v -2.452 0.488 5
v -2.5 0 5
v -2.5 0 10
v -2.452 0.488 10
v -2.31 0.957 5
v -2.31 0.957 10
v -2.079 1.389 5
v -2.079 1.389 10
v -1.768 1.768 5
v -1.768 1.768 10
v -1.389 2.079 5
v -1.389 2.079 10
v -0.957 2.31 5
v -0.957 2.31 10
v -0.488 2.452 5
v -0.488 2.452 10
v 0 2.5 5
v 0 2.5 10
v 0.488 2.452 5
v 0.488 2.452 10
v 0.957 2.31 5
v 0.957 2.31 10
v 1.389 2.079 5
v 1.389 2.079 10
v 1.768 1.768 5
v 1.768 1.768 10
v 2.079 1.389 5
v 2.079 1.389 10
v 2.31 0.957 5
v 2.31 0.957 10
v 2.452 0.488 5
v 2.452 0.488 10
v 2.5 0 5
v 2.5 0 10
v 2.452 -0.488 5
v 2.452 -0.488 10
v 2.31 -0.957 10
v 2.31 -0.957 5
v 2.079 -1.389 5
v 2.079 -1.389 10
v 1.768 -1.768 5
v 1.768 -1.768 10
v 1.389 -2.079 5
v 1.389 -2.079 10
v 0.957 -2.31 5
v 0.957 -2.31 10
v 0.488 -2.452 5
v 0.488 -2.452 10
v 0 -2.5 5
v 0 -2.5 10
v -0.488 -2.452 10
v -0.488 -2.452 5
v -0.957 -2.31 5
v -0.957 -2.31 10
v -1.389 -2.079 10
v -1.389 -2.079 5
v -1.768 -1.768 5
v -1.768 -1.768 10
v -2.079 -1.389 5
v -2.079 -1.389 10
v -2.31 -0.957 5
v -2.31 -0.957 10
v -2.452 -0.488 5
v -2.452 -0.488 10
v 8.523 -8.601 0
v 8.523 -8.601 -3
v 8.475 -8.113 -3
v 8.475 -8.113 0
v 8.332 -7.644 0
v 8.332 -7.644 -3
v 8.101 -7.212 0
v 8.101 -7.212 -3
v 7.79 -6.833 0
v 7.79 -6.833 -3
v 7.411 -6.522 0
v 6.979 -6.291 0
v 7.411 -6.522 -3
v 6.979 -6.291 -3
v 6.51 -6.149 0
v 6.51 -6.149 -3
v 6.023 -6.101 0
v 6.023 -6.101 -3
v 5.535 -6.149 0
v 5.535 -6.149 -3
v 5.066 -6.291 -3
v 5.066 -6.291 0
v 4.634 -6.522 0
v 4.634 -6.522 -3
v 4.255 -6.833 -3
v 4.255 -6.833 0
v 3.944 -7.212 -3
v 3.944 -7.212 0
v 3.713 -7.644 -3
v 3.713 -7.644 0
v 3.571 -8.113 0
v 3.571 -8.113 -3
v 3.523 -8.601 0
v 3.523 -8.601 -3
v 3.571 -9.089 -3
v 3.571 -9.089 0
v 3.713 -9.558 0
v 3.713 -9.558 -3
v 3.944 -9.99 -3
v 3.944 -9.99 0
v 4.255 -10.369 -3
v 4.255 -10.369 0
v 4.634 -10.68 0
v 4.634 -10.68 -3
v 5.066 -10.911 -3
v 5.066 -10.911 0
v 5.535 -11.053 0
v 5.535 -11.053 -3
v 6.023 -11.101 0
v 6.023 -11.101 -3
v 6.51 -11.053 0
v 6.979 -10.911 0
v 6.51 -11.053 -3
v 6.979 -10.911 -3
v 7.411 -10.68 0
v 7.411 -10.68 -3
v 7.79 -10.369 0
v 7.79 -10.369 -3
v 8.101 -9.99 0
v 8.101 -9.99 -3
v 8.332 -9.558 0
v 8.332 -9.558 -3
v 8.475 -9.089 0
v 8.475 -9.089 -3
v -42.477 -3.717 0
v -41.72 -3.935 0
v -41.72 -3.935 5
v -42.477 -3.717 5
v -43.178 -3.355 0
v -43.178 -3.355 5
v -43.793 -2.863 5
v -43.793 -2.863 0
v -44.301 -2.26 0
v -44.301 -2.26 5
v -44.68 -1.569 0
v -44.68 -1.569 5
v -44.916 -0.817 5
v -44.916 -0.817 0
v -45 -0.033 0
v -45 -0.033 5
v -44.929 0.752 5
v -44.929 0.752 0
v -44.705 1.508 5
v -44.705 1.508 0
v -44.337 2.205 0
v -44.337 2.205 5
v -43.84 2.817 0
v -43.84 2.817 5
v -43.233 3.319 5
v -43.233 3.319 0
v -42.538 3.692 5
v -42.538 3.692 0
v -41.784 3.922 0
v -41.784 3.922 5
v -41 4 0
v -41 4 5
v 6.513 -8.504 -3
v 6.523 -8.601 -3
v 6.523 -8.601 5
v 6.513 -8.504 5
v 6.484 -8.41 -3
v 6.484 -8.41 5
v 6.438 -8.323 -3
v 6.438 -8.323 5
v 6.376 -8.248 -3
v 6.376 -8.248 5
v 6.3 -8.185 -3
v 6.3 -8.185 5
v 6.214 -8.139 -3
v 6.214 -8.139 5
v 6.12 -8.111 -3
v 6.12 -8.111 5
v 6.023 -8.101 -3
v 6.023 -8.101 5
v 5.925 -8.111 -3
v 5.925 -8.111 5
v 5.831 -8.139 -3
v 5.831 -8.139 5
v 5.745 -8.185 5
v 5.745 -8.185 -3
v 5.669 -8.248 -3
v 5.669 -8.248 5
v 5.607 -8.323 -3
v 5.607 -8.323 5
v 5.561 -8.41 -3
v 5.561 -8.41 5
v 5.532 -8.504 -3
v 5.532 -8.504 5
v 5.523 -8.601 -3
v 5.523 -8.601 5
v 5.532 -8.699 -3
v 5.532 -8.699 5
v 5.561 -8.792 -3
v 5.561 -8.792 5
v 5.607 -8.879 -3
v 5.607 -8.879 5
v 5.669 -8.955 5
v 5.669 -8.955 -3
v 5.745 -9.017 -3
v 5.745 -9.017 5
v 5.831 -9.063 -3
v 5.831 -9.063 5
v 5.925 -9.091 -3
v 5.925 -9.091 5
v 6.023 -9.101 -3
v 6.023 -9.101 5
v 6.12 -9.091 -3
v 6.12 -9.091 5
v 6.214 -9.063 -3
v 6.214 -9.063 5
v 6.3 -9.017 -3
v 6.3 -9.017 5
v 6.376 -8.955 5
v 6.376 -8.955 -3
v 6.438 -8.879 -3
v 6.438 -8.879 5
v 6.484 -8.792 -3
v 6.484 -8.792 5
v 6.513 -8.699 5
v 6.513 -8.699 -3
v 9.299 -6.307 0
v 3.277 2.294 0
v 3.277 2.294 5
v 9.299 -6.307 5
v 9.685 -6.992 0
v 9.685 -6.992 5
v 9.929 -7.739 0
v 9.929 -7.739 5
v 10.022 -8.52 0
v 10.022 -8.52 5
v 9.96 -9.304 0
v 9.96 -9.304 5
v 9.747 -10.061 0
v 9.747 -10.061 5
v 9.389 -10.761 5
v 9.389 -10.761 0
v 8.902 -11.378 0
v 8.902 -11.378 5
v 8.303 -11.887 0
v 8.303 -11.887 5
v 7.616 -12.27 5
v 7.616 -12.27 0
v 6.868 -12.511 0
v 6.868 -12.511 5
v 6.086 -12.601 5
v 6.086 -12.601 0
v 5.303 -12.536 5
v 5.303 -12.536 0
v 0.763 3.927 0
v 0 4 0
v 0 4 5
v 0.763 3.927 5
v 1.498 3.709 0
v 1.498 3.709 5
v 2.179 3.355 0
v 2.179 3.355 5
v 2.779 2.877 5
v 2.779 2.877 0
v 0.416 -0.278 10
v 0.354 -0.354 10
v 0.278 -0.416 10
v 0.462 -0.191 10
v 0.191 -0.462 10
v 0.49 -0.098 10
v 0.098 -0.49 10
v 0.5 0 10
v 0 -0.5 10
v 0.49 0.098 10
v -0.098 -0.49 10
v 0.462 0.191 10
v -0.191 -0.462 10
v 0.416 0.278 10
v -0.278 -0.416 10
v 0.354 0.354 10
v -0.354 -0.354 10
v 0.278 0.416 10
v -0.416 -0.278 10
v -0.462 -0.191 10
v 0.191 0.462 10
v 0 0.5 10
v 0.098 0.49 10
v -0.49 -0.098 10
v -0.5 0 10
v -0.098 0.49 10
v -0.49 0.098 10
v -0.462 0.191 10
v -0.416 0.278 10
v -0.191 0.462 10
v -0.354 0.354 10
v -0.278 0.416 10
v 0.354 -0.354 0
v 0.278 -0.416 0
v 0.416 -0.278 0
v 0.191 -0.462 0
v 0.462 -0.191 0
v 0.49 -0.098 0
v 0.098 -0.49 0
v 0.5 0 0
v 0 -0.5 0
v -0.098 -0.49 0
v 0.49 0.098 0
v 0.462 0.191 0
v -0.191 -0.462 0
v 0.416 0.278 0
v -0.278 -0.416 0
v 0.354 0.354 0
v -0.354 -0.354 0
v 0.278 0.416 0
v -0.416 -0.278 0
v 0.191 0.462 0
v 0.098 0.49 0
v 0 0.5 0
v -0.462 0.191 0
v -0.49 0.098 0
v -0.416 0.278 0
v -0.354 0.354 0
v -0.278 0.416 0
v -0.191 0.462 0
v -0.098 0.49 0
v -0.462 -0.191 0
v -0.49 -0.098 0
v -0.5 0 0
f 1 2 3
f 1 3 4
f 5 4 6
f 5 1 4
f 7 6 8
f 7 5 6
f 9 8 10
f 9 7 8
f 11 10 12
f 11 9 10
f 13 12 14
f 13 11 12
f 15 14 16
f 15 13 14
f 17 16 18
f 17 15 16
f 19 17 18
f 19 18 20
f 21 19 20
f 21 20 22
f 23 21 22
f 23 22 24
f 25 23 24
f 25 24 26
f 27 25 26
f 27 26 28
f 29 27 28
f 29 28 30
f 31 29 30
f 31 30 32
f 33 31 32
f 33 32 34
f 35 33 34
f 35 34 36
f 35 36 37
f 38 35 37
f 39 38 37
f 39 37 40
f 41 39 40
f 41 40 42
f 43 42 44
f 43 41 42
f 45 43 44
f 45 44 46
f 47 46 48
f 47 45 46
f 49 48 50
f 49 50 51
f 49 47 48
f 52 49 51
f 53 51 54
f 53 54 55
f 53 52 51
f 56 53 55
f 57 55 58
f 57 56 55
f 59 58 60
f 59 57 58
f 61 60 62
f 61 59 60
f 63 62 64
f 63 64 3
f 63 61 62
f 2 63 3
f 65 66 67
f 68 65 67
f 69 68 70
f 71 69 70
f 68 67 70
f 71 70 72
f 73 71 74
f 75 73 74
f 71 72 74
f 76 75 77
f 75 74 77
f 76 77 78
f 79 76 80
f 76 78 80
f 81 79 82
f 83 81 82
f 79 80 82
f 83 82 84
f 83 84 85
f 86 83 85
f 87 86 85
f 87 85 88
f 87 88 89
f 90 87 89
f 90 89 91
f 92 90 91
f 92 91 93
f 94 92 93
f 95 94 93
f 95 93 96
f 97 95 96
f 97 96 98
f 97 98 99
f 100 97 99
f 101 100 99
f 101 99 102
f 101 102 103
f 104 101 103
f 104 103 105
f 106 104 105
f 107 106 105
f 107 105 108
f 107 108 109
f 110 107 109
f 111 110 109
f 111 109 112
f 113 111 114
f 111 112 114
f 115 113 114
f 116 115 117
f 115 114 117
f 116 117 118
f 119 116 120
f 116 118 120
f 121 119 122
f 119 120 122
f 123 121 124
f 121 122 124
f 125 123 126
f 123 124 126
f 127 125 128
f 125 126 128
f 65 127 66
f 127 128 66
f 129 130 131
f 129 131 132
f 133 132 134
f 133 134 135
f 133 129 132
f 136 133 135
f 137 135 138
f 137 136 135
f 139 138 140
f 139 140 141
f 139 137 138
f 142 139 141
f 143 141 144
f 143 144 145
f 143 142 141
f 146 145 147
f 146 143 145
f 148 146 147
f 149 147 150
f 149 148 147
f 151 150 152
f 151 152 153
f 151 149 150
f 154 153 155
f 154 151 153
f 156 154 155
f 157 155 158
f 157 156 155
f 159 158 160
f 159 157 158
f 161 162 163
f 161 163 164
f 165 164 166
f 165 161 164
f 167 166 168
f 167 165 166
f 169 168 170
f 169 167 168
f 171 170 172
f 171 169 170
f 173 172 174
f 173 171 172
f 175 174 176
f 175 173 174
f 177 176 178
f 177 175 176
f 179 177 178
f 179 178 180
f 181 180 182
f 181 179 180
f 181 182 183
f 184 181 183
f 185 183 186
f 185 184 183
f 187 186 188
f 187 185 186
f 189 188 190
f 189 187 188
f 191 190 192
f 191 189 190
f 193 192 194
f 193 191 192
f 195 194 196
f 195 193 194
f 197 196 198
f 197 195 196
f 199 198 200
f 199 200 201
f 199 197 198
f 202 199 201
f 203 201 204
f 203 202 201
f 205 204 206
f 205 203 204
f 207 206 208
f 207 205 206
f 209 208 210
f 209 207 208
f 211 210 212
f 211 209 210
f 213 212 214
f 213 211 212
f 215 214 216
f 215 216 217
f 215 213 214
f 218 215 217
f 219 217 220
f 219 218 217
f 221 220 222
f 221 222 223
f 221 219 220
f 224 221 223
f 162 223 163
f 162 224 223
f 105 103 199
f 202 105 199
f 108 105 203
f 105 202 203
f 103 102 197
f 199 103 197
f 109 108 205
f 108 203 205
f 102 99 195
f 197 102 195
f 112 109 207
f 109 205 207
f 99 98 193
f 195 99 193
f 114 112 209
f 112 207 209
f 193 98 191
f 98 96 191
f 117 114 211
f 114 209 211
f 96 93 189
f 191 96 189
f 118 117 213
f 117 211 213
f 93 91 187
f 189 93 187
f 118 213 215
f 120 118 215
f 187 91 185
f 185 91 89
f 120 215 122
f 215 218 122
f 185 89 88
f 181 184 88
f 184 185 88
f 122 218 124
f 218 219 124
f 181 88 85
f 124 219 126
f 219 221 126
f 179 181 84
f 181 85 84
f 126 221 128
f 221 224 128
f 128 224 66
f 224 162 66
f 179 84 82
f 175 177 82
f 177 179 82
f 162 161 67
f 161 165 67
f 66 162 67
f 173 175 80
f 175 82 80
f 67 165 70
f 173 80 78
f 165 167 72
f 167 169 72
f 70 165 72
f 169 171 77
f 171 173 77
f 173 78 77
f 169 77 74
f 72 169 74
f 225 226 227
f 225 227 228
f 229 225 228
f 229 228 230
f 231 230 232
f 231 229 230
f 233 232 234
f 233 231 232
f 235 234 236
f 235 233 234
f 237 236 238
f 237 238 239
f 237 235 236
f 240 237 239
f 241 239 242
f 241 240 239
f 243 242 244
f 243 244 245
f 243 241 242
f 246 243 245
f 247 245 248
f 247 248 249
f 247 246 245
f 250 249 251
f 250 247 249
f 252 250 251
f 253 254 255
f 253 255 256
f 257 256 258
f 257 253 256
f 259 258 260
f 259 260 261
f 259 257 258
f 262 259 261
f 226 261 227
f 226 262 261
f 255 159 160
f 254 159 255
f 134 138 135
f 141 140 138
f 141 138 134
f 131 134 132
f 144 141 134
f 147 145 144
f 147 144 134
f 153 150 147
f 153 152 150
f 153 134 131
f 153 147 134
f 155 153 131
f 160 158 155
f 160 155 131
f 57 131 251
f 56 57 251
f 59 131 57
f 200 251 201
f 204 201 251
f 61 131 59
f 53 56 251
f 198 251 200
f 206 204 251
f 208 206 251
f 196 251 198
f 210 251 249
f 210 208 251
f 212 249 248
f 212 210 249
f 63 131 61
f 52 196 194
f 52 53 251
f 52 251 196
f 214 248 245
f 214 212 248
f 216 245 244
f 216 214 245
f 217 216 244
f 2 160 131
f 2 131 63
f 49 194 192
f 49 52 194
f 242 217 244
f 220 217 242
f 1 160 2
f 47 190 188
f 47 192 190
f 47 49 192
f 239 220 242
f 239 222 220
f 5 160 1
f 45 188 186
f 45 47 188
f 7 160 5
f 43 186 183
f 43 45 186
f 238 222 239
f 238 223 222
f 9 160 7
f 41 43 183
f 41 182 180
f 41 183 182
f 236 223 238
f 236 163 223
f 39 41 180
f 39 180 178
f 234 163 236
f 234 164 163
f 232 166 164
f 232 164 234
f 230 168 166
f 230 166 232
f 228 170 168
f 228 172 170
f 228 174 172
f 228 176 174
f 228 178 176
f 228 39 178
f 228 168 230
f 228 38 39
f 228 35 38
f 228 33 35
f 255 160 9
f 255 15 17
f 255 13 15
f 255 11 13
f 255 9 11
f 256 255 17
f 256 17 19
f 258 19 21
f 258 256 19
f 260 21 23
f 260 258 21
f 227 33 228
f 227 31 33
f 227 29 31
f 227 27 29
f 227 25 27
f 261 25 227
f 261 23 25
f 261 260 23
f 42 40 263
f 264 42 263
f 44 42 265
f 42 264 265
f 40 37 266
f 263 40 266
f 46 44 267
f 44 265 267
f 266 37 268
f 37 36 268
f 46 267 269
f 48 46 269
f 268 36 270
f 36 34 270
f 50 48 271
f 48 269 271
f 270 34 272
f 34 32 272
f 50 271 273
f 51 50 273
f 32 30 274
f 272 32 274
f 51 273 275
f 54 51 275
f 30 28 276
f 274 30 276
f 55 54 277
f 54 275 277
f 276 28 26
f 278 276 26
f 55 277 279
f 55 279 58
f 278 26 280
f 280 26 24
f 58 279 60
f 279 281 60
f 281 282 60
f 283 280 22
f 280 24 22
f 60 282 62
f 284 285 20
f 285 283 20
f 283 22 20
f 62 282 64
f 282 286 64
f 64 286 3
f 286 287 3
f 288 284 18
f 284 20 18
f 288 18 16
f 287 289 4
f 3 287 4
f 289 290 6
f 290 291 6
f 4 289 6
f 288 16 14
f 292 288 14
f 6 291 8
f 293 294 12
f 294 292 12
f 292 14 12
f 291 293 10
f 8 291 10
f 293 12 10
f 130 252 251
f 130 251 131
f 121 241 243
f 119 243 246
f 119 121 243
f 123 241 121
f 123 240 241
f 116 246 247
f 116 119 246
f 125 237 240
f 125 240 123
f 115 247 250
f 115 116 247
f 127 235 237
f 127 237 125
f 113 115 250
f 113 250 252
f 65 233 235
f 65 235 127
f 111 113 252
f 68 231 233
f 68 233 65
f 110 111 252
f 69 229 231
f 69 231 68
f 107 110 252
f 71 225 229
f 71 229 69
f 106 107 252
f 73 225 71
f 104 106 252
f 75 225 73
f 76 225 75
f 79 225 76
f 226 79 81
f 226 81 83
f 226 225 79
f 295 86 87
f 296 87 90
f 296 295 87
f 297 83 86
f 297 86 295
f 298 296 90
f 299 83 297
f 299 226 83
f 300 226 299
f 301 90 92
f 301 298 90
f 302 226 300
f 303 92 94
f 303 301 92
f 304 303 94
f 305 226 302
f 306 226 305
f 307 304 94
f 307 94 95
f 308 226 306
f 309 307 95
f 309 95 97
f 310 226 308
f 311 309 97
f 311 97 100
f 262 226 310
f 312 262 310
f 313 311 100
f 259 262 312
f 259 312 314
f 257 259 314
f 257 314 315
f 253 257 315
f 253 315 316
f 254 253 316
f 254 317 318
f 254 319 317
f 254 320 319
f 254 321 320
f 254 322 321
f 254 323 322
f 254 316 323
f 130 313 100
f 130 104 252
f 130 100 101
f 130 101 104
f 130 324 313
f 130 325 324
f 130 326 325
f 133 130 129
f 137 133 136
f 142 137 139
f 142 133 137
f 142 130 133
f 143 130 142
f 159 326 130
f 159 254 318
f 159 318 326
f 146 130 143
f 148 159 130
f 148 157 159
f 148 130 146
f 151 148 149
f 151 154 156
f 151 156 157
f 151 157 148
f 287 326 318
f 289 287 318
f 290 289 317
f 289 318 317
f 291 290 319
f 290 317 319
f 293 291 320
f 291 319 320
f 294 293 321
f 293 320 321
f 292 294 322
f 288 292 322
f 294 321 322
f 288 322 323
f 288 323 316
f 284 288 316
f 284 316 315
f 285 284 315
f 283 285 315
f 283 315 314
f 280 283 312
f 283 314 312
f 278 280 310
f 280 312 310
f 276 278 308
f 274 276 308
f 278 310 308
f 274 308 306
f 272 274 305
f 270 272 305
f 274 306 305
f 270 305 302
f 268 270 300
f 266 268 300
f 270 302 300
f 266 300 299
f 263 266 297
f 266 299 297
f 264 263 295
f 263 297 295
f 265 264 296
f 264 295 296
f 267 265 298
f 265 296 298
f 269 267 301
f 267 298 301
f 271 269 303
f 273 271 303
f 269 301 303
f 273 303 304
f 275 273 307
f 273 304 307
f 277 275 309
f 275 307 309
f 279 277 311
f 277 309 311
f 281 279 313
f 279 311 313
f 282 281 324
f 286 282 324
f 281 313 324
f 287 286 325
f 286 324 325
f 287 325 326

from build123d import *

# Parameters (mm, degrees)
SKETCH2_R           = 2.5
BOSS_EXTRUDE1_DEPTH = 5
BOSS_EXTRUDE2_START = -8
SKETCH3_R           = 2.5
SKETCH3_R_2         = 0.5
BOSS_EXTRUDE2_DEPTH = 8
SKETCH4_R           = 2.5
SKETCH4_R_2         = 0.5
BOSS_EXTRUDE3_DEPTH = 10


with BuildPart() as part:
    # Sketch2 → Boss-Extrude1 (new body)
    with BuildSketch(Plane.XY):
        with BuildLine():
            Line((-41, 4), (0, 4))
            ThreePointArc((0, 4), (1.846994453, 3.548043333), (3.276608177, 2.294305745))
            Line((3.276608177, 2.294305745), (9.299160759, -6.30679072))
            ThreePointArc((9.299160759, -6.30679072), (9.389243762, -10.761047968), (5.302836395, -12.53581483))
            Line((5.302836395, -12.53581483), (-41.719716186, -3.934718365))
            ThreePointArc((-41.719716186, -3.934718365), (-44.98364616, 0.361335399), (-41, 4))
        make_face()
        Circle(SKETCH2_R, mode=Mode.SUBTRACT)
        with Locations((6.022552582, -8.601096465)):
            Circle(SKETCH2_R, mode=Mode.SUBTRACT)
    extrude(amount=BOSS_EXTRUDE1_DEPTH)

    # Sketch3 → Boss-Extrude2 (add)
    with BuildSketch(Plane.XY.offset(5).offset(BOSS_EXTRUDE2_START)):
        with Locations((6.022552582, -8.601096465)):
            Circle(SKETCH3_R)
        with Locations((6.022552582, -8.601096465)):
            Circle(SKETCH3_R_2, mode=Mode.SUBTRACT)
    extrude(amount=BOSS_EXTRUDE2_DEPTH)

    # Sketch4 → Boss-Extrude3 (add)
    with BuildSketch(Plane(origin=(0, 0, 0), x_dir=(-1, 0, 0), z_dir=(0, 0, -1))):
        Circle(SKETCH4_R)
        Circle(SKETCH4_R_2, mode=Mode.SUBTRACT)
    extrude(amount=-BOSS_EXTRUDE3_DEPTH)


solid = part.part
